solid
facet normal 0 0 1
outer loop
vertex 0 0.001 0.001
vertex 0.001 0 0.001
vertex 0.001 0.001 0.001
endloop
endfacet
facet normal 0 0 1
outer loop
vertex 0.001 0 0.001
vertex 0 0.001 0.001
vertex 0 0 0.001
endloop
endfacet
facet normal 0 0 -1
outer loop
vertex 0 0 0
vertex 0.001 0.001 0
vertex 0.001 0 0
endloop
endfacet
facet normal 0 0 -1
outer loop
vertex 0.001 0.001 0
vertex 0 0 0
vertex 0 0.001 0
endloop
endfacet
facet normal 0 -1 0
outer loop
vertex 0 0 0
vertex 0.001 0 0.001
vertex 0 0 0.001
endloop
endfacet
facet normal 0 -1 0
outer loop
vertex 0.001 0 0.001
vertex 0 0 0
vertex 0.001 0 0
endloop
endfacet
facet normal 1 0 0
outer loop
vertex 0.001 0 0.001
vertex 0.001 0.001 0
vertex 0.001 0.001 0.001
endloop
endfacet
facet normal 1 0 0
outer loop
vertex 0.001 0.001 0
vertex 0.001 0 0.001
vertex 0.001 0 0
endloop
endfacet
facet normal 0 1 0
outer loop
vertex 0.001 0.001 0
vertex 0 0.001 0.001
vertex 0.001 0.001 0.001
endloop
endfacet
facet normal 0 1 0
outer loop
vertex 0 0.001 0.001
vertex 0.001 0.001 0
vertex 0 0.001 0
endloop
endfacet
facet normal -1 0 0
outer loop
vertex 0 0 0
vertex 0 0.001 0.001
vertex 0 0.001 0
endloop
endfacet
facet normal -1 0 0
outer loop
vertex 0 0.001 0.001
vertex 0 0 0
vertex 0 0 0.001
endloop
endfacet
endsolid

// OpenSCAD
// t_net — the network layer, as PURE DATA. Nothing here renders, and none of it
// depends on $fa/$fs. This is the tier that catches what "Simple: yes" cannot,
// and every silent failure this design was reviewed against passed "Simple: yes".

use <../src/uniTube.scad>;

$fa = 12;
$fs = 2;

prof = ut_round(od = 12, id = 8);
big = ut_round(od = 20, wall = 2);

// ============================================ a wall-landing tee
trunk = ut_run("trunk", ut_polyline([ [ -50, 0, 0 ], [ 50, 0, 0 ] ]), big);
branch = ut_run("branch", ut_polyline([ [ 0, 10, 0 ], [ 0, 50, 0 ] ]), prof);
tee = ut_net([ trunk, branch ], [ut_joint([ [ "trunk", [ "s", 50 ] ], [ "branch", "a" ] ])]);

// --- ports are DERIVED FROM GRAPH DEGREE, never declared ---------------------
// A joint-incident end is not a port, so "which ends are open?" is a computed
// fact rather than user bookkeeping.
names = [for (p = ut_ports(tee)) ut_port_name(p)];
assert(len(names) == 3, str("a tee has 3 open ends, got ", len(names), ": ", names));
assert(len([for (n = names) if (n == "branch.a") 1]) == 0, "branch.a is joint-incident and must NOT be a port");
assert(len([for (n = names) if (n == "branch.b") 1]) == 1, "branch.b is open");

// A port still carries a full FRAME, and its direction is OUTWARD.
pb = ut_port_named(tee, "branch.b");
assert(norm(ut_port_pos(pb) - [ 0, 50, 0 ]) < 1e-9, "port position");
assert(norm(ut_port_dir(pb) - [ 0, 1, 0 ]) < 1e-12, "port dir points OUTWARD, exactly");
assert(abs(norm(ut_port_normal(pb)) - 1) < 1e-9, "port carries a unit roll reference");

// --- the joint node sits on the trunk CENTRELINE, not on its wall ------------
// This is the whole reason a mid-run landing is expressible: the node must be
// somewhere the branch bore can be aimed at.
j = ut_net_joints(tee)[0];
node = ut_joint_node(tee, j);
assert(norm(node - [ 0, 0, 0 ]) < 1e-9, str("mid-run landing puts the node on the trunk axis, got ", node));

// --- the joint's two radii are MEASURED from the incident profiles -----------
assert(abs(ut_joint_shell_r(tee, j) - 10) < 1e-9, "shell radius = the farthest incident outer reach (trunk od/2)");
core = ut_joint_core_r(tee, j);
assert(core > 3.9 && core < 4.0, str("core radius = the smallest incident bore inradius (~4), got ", core));
assert(core < ut_joint_shell_r(tee, j), "NET-4: the ball must have a wall");

// --- BOTH shell and bore are extended into the joint -------------------------
// Extending only the bore leaves the shells touching TANGENTIALLY: measured,
// `Simple: yes, Volumes: 3` -- two solids sharing a circle.
sh = _ut_run_stations(tee, branch, "shell");
bo = _ut_run_stations(tee, branch, "bore");
base = ut_stations(ut_run_path(branch));
assert(len(sh) == len(base) + 1, "the shell gains one station at the joint-incident end");
assert(len(bo) == len(base) + 1, "so does the bore");
// The shell reaches the node; the bore goes half a core-radius further.
assert(norm(ut_st_p(sh[0]) - node) < 1e-6, str("shell extension reaches the node, got ", ut_st_p(sh[0])));
assert(norm(ut_st_p(bo[0]) - node) - core / 2 < 1e-6, "bore extension passes the node by half a core radius");
// The extension is COLLINEAR, so it cannot disturb the frame.
assert(ut_turn(ut_st_t(sh[0]), ut_st_t(base[0])) < 1e-9, "extension shares the end tangent exactly");
assert(norm(ut_st_n(sh[0]) - ut_st_n(base[0])) < 1e-9, "and the end roll reference");

// --- the open end is NOT extended -------------------------------------------
assert(norm(ut_st_p(sh[len(sh) - 1]) - [ 0, 50, 0 ]) < 1e-9, "a port end is left exactly where the path put it");

// ============================================ lumen groups
path = ut_polyline([ [ 0, 0, 0 ], [ 60, 0, 0 ], [ 60, 50, 0 ] ], r = 20);
jack = ut_net([
    ut_run("jacket", path, ut_round(od = 30, id = 26), group = 0),
    ut_run("liner", path, ut_round(od = 12, id = 8), group = 1),
]);
assert(len(ut_groups(jack)) == 2, "two lumen groups");
assert(ut_check_net(jack), "a correctly grouped jacket validates");
// Every end is open: no joints, so four ports.
assert(len(ut_ports(jack)) == 4, "a jacket has four open ends");

// ============================================ the 4-into-1 manifold
N = 4;
branches = [for (i = [0:N - 1]) let(th = 360 * i / N) ut_run(
    str("in", i),
    ut_polyline([ [ 50 * cos(th), 50 * sin(th), -55 ], [ 50 * cos(th), 50 * sin(th), -25 ], [ 0, 0, 0 ] ], r = 15),
    prof)];
man = ut_net(concat(branches, [ut_run("out", ut_polyline([ [ 0, 0, 0 ], [ 0, 0, 55 ] ]), ut_round(od = 16, id = 12))]),
             [ut_joint(concat([for (i = [0:N - 1])[str("in", i), "b"]], [[ "out", "a" ]]), at = [ 0, 0, 0 ])]);

assert(ut_check_net(man), "the manifold validates");
mp = [for (p = ut_ports(man)) ut_port_name(p)];
assert(len(mp) == 5, str("the manifold has exactly 5 open ends, got ", len(mp), ": ", mp));
assert(len([for (n = mp) if (n == "out.b") 1]) == 1, "the outlet is open");
assert(len([for (n = mp) if (n == "in0.b") 1]) == 0, "every inlet's joint end is consumed by the joint");
// Five runs meet at one node, and every one of them is extended to reach it.
mj = ut_net_joints(man)[0];
assert(len(ut_joint_incident(mj)) == 5, "five incident ends");
assert(abs(ut_joint_shell_r(man, mj) - 8) < 1e-9, "shell radius = the trunk's od/2, the largest incident reach");

// ============================================ the port frame IS the swept frame
// ut_ports() used to call _ut_end_station with the DEFAULT opts, while
// ut_assemble sweeps with concat(opts, ut_run_opts(r)). Measured before the fix:
// a run carrying opts=[["twist",90]] reported a port normal 90 degrees from the
// geometry it would be bolted to -- silently, exit 0. A port carrying a FRAME
// rather than a diameter is the entire premise of ADR 0005.
tw = ut_run("tw", ut_polyline([ [ 0, 0, 0 ], [ 60, 0, 0 ] ]), prof, opts = [[ "twist", 90 ]]);
twnet = ut_net([tw]);
pb2 = ut_port_named(twnet, "tw.b");
swept = ut_stations(ut_polyline([ [ 0, 0, 0 ], [ 60, 0, 0 ] ]), [[ "twist", 90 ]]);
assert(ut_turn(ut_port_normal(pb2), ut_st_n(swept[len(swept) - 1])) < 1e-9,
       str("the port frame must equal the frame actually swept; skew was ",
           ut_turn(ut_port_normal(pb2), ut_st_n(swept[len(swept) - 1])), " deg"));

// ============================================ NET-5 and its joint exemption
// NET-5 was an ENDPOINT test until 2026-08-21 and the miss was total. It is now
// a SAMPLED path-distance test, which introduces the opposite hazard: two runs
// meeting at a joint NECESSARILY approach within a bore radius -- that is what a
// joint is -- so without an exemption the check rejects every tee in the library.
// Both directions are asserted here; the negative cases live in tests/guards/.

JK = ut_round(od = 30, id = 26);
LN = ut_round(od = 12, id = 8);

// Correctly grouped: no comparison happens at all, offset or not.
assert(ut_check_net(ut_net([
           ut_run("j", ut_polyline([ [ 0, 0, 0 ], [ 200, 0, 0 ] ]), JK, group = 0),
           ut_run("l", ut_polyline([ [ 70, 0, 0 ], [ 130, 0, 0 ] ]), LN, group = 1),
       ])),
       "a correctly grouped jacket validates whether or not the liner is offset");

// THE EXEMPTION, and it is load-bearing rather than decorative. A BIG trunk whose
// bore comfortably contains a small branch satisfies the nesting precondition,
// and the branch's centreline enters that bore by design. Verified: removing the
// exemption makes exactly this case fail.
bigtee = ut_net(
    [
        ut_run("trunk", ut_polyline([ [ -60, 0, 0 ], [ 60, 0, 0 ] ]), ut_round(od = 40, id = 34)),
        ut_run("branch", ut_polyline([ [ 0, 0, 0 ], [ 0, 60, 0 ] ]), LN),
    ],
    [ut_joint([ [ "trunk", [ "s", 60 ] ], [ "branch", "a" ] ])]);
assert(ut_check_net(bigtee), "a branch that FITS inside its trunk's bore and is JOINED to it must not trip NET-5");

// And the 4-into-1 manifold, five runs meeting at one node, still validates.
assert(ut_check_net(man), "the manifold must not trip NET-5 either");

// ============================================ body = "none"
// A documented joint body with no coverage at all. It emits no sphere, so the
// shells must overlap on their own -- NET-3 is what makes that safe. NET-4 must
// SKIP it: a "none" joint has no ball, so "the ball has no wall" cannot apply,
// and a bodyless joint whose incident bores happen to match the reach would
// otherwise abort on a rule about a sphere that is never emitted.
bare = ut_net(
    [
        ut_run("t2", ut_polyline([ [ -60, 0, 0 ], [ 60, 0, 0 ] ]), ut_round(od = 20, wall = 2.5)),
        ut_run("b2", ut_polyline([ [ 0, 0, 0 ], [ 0, 0, 55 ] ]), ut_round(od = 12, wall = 2)),
    ],
    [ut_joint([ [ "t2", [ "s", 60 ] ], [ "b2", "a" ] ], body = "none")]);
assert(ut_check_net(bare), "a joint with body=\"none\" must validate");
assert(ut_joint_body(ut_net_joints(bare)[0]) == "none", "and it must round-trip through the record");
// Its ends are still consumed by the joint, so neither becomes a port.
assert(len([for (pt = ut_ports(bare)) if (ut_port_name(pt) == "b2.a") 1]) == 0,
       "a bodyless joint still consumes the run ends incident to it");

cube(0.001); // sentinel
